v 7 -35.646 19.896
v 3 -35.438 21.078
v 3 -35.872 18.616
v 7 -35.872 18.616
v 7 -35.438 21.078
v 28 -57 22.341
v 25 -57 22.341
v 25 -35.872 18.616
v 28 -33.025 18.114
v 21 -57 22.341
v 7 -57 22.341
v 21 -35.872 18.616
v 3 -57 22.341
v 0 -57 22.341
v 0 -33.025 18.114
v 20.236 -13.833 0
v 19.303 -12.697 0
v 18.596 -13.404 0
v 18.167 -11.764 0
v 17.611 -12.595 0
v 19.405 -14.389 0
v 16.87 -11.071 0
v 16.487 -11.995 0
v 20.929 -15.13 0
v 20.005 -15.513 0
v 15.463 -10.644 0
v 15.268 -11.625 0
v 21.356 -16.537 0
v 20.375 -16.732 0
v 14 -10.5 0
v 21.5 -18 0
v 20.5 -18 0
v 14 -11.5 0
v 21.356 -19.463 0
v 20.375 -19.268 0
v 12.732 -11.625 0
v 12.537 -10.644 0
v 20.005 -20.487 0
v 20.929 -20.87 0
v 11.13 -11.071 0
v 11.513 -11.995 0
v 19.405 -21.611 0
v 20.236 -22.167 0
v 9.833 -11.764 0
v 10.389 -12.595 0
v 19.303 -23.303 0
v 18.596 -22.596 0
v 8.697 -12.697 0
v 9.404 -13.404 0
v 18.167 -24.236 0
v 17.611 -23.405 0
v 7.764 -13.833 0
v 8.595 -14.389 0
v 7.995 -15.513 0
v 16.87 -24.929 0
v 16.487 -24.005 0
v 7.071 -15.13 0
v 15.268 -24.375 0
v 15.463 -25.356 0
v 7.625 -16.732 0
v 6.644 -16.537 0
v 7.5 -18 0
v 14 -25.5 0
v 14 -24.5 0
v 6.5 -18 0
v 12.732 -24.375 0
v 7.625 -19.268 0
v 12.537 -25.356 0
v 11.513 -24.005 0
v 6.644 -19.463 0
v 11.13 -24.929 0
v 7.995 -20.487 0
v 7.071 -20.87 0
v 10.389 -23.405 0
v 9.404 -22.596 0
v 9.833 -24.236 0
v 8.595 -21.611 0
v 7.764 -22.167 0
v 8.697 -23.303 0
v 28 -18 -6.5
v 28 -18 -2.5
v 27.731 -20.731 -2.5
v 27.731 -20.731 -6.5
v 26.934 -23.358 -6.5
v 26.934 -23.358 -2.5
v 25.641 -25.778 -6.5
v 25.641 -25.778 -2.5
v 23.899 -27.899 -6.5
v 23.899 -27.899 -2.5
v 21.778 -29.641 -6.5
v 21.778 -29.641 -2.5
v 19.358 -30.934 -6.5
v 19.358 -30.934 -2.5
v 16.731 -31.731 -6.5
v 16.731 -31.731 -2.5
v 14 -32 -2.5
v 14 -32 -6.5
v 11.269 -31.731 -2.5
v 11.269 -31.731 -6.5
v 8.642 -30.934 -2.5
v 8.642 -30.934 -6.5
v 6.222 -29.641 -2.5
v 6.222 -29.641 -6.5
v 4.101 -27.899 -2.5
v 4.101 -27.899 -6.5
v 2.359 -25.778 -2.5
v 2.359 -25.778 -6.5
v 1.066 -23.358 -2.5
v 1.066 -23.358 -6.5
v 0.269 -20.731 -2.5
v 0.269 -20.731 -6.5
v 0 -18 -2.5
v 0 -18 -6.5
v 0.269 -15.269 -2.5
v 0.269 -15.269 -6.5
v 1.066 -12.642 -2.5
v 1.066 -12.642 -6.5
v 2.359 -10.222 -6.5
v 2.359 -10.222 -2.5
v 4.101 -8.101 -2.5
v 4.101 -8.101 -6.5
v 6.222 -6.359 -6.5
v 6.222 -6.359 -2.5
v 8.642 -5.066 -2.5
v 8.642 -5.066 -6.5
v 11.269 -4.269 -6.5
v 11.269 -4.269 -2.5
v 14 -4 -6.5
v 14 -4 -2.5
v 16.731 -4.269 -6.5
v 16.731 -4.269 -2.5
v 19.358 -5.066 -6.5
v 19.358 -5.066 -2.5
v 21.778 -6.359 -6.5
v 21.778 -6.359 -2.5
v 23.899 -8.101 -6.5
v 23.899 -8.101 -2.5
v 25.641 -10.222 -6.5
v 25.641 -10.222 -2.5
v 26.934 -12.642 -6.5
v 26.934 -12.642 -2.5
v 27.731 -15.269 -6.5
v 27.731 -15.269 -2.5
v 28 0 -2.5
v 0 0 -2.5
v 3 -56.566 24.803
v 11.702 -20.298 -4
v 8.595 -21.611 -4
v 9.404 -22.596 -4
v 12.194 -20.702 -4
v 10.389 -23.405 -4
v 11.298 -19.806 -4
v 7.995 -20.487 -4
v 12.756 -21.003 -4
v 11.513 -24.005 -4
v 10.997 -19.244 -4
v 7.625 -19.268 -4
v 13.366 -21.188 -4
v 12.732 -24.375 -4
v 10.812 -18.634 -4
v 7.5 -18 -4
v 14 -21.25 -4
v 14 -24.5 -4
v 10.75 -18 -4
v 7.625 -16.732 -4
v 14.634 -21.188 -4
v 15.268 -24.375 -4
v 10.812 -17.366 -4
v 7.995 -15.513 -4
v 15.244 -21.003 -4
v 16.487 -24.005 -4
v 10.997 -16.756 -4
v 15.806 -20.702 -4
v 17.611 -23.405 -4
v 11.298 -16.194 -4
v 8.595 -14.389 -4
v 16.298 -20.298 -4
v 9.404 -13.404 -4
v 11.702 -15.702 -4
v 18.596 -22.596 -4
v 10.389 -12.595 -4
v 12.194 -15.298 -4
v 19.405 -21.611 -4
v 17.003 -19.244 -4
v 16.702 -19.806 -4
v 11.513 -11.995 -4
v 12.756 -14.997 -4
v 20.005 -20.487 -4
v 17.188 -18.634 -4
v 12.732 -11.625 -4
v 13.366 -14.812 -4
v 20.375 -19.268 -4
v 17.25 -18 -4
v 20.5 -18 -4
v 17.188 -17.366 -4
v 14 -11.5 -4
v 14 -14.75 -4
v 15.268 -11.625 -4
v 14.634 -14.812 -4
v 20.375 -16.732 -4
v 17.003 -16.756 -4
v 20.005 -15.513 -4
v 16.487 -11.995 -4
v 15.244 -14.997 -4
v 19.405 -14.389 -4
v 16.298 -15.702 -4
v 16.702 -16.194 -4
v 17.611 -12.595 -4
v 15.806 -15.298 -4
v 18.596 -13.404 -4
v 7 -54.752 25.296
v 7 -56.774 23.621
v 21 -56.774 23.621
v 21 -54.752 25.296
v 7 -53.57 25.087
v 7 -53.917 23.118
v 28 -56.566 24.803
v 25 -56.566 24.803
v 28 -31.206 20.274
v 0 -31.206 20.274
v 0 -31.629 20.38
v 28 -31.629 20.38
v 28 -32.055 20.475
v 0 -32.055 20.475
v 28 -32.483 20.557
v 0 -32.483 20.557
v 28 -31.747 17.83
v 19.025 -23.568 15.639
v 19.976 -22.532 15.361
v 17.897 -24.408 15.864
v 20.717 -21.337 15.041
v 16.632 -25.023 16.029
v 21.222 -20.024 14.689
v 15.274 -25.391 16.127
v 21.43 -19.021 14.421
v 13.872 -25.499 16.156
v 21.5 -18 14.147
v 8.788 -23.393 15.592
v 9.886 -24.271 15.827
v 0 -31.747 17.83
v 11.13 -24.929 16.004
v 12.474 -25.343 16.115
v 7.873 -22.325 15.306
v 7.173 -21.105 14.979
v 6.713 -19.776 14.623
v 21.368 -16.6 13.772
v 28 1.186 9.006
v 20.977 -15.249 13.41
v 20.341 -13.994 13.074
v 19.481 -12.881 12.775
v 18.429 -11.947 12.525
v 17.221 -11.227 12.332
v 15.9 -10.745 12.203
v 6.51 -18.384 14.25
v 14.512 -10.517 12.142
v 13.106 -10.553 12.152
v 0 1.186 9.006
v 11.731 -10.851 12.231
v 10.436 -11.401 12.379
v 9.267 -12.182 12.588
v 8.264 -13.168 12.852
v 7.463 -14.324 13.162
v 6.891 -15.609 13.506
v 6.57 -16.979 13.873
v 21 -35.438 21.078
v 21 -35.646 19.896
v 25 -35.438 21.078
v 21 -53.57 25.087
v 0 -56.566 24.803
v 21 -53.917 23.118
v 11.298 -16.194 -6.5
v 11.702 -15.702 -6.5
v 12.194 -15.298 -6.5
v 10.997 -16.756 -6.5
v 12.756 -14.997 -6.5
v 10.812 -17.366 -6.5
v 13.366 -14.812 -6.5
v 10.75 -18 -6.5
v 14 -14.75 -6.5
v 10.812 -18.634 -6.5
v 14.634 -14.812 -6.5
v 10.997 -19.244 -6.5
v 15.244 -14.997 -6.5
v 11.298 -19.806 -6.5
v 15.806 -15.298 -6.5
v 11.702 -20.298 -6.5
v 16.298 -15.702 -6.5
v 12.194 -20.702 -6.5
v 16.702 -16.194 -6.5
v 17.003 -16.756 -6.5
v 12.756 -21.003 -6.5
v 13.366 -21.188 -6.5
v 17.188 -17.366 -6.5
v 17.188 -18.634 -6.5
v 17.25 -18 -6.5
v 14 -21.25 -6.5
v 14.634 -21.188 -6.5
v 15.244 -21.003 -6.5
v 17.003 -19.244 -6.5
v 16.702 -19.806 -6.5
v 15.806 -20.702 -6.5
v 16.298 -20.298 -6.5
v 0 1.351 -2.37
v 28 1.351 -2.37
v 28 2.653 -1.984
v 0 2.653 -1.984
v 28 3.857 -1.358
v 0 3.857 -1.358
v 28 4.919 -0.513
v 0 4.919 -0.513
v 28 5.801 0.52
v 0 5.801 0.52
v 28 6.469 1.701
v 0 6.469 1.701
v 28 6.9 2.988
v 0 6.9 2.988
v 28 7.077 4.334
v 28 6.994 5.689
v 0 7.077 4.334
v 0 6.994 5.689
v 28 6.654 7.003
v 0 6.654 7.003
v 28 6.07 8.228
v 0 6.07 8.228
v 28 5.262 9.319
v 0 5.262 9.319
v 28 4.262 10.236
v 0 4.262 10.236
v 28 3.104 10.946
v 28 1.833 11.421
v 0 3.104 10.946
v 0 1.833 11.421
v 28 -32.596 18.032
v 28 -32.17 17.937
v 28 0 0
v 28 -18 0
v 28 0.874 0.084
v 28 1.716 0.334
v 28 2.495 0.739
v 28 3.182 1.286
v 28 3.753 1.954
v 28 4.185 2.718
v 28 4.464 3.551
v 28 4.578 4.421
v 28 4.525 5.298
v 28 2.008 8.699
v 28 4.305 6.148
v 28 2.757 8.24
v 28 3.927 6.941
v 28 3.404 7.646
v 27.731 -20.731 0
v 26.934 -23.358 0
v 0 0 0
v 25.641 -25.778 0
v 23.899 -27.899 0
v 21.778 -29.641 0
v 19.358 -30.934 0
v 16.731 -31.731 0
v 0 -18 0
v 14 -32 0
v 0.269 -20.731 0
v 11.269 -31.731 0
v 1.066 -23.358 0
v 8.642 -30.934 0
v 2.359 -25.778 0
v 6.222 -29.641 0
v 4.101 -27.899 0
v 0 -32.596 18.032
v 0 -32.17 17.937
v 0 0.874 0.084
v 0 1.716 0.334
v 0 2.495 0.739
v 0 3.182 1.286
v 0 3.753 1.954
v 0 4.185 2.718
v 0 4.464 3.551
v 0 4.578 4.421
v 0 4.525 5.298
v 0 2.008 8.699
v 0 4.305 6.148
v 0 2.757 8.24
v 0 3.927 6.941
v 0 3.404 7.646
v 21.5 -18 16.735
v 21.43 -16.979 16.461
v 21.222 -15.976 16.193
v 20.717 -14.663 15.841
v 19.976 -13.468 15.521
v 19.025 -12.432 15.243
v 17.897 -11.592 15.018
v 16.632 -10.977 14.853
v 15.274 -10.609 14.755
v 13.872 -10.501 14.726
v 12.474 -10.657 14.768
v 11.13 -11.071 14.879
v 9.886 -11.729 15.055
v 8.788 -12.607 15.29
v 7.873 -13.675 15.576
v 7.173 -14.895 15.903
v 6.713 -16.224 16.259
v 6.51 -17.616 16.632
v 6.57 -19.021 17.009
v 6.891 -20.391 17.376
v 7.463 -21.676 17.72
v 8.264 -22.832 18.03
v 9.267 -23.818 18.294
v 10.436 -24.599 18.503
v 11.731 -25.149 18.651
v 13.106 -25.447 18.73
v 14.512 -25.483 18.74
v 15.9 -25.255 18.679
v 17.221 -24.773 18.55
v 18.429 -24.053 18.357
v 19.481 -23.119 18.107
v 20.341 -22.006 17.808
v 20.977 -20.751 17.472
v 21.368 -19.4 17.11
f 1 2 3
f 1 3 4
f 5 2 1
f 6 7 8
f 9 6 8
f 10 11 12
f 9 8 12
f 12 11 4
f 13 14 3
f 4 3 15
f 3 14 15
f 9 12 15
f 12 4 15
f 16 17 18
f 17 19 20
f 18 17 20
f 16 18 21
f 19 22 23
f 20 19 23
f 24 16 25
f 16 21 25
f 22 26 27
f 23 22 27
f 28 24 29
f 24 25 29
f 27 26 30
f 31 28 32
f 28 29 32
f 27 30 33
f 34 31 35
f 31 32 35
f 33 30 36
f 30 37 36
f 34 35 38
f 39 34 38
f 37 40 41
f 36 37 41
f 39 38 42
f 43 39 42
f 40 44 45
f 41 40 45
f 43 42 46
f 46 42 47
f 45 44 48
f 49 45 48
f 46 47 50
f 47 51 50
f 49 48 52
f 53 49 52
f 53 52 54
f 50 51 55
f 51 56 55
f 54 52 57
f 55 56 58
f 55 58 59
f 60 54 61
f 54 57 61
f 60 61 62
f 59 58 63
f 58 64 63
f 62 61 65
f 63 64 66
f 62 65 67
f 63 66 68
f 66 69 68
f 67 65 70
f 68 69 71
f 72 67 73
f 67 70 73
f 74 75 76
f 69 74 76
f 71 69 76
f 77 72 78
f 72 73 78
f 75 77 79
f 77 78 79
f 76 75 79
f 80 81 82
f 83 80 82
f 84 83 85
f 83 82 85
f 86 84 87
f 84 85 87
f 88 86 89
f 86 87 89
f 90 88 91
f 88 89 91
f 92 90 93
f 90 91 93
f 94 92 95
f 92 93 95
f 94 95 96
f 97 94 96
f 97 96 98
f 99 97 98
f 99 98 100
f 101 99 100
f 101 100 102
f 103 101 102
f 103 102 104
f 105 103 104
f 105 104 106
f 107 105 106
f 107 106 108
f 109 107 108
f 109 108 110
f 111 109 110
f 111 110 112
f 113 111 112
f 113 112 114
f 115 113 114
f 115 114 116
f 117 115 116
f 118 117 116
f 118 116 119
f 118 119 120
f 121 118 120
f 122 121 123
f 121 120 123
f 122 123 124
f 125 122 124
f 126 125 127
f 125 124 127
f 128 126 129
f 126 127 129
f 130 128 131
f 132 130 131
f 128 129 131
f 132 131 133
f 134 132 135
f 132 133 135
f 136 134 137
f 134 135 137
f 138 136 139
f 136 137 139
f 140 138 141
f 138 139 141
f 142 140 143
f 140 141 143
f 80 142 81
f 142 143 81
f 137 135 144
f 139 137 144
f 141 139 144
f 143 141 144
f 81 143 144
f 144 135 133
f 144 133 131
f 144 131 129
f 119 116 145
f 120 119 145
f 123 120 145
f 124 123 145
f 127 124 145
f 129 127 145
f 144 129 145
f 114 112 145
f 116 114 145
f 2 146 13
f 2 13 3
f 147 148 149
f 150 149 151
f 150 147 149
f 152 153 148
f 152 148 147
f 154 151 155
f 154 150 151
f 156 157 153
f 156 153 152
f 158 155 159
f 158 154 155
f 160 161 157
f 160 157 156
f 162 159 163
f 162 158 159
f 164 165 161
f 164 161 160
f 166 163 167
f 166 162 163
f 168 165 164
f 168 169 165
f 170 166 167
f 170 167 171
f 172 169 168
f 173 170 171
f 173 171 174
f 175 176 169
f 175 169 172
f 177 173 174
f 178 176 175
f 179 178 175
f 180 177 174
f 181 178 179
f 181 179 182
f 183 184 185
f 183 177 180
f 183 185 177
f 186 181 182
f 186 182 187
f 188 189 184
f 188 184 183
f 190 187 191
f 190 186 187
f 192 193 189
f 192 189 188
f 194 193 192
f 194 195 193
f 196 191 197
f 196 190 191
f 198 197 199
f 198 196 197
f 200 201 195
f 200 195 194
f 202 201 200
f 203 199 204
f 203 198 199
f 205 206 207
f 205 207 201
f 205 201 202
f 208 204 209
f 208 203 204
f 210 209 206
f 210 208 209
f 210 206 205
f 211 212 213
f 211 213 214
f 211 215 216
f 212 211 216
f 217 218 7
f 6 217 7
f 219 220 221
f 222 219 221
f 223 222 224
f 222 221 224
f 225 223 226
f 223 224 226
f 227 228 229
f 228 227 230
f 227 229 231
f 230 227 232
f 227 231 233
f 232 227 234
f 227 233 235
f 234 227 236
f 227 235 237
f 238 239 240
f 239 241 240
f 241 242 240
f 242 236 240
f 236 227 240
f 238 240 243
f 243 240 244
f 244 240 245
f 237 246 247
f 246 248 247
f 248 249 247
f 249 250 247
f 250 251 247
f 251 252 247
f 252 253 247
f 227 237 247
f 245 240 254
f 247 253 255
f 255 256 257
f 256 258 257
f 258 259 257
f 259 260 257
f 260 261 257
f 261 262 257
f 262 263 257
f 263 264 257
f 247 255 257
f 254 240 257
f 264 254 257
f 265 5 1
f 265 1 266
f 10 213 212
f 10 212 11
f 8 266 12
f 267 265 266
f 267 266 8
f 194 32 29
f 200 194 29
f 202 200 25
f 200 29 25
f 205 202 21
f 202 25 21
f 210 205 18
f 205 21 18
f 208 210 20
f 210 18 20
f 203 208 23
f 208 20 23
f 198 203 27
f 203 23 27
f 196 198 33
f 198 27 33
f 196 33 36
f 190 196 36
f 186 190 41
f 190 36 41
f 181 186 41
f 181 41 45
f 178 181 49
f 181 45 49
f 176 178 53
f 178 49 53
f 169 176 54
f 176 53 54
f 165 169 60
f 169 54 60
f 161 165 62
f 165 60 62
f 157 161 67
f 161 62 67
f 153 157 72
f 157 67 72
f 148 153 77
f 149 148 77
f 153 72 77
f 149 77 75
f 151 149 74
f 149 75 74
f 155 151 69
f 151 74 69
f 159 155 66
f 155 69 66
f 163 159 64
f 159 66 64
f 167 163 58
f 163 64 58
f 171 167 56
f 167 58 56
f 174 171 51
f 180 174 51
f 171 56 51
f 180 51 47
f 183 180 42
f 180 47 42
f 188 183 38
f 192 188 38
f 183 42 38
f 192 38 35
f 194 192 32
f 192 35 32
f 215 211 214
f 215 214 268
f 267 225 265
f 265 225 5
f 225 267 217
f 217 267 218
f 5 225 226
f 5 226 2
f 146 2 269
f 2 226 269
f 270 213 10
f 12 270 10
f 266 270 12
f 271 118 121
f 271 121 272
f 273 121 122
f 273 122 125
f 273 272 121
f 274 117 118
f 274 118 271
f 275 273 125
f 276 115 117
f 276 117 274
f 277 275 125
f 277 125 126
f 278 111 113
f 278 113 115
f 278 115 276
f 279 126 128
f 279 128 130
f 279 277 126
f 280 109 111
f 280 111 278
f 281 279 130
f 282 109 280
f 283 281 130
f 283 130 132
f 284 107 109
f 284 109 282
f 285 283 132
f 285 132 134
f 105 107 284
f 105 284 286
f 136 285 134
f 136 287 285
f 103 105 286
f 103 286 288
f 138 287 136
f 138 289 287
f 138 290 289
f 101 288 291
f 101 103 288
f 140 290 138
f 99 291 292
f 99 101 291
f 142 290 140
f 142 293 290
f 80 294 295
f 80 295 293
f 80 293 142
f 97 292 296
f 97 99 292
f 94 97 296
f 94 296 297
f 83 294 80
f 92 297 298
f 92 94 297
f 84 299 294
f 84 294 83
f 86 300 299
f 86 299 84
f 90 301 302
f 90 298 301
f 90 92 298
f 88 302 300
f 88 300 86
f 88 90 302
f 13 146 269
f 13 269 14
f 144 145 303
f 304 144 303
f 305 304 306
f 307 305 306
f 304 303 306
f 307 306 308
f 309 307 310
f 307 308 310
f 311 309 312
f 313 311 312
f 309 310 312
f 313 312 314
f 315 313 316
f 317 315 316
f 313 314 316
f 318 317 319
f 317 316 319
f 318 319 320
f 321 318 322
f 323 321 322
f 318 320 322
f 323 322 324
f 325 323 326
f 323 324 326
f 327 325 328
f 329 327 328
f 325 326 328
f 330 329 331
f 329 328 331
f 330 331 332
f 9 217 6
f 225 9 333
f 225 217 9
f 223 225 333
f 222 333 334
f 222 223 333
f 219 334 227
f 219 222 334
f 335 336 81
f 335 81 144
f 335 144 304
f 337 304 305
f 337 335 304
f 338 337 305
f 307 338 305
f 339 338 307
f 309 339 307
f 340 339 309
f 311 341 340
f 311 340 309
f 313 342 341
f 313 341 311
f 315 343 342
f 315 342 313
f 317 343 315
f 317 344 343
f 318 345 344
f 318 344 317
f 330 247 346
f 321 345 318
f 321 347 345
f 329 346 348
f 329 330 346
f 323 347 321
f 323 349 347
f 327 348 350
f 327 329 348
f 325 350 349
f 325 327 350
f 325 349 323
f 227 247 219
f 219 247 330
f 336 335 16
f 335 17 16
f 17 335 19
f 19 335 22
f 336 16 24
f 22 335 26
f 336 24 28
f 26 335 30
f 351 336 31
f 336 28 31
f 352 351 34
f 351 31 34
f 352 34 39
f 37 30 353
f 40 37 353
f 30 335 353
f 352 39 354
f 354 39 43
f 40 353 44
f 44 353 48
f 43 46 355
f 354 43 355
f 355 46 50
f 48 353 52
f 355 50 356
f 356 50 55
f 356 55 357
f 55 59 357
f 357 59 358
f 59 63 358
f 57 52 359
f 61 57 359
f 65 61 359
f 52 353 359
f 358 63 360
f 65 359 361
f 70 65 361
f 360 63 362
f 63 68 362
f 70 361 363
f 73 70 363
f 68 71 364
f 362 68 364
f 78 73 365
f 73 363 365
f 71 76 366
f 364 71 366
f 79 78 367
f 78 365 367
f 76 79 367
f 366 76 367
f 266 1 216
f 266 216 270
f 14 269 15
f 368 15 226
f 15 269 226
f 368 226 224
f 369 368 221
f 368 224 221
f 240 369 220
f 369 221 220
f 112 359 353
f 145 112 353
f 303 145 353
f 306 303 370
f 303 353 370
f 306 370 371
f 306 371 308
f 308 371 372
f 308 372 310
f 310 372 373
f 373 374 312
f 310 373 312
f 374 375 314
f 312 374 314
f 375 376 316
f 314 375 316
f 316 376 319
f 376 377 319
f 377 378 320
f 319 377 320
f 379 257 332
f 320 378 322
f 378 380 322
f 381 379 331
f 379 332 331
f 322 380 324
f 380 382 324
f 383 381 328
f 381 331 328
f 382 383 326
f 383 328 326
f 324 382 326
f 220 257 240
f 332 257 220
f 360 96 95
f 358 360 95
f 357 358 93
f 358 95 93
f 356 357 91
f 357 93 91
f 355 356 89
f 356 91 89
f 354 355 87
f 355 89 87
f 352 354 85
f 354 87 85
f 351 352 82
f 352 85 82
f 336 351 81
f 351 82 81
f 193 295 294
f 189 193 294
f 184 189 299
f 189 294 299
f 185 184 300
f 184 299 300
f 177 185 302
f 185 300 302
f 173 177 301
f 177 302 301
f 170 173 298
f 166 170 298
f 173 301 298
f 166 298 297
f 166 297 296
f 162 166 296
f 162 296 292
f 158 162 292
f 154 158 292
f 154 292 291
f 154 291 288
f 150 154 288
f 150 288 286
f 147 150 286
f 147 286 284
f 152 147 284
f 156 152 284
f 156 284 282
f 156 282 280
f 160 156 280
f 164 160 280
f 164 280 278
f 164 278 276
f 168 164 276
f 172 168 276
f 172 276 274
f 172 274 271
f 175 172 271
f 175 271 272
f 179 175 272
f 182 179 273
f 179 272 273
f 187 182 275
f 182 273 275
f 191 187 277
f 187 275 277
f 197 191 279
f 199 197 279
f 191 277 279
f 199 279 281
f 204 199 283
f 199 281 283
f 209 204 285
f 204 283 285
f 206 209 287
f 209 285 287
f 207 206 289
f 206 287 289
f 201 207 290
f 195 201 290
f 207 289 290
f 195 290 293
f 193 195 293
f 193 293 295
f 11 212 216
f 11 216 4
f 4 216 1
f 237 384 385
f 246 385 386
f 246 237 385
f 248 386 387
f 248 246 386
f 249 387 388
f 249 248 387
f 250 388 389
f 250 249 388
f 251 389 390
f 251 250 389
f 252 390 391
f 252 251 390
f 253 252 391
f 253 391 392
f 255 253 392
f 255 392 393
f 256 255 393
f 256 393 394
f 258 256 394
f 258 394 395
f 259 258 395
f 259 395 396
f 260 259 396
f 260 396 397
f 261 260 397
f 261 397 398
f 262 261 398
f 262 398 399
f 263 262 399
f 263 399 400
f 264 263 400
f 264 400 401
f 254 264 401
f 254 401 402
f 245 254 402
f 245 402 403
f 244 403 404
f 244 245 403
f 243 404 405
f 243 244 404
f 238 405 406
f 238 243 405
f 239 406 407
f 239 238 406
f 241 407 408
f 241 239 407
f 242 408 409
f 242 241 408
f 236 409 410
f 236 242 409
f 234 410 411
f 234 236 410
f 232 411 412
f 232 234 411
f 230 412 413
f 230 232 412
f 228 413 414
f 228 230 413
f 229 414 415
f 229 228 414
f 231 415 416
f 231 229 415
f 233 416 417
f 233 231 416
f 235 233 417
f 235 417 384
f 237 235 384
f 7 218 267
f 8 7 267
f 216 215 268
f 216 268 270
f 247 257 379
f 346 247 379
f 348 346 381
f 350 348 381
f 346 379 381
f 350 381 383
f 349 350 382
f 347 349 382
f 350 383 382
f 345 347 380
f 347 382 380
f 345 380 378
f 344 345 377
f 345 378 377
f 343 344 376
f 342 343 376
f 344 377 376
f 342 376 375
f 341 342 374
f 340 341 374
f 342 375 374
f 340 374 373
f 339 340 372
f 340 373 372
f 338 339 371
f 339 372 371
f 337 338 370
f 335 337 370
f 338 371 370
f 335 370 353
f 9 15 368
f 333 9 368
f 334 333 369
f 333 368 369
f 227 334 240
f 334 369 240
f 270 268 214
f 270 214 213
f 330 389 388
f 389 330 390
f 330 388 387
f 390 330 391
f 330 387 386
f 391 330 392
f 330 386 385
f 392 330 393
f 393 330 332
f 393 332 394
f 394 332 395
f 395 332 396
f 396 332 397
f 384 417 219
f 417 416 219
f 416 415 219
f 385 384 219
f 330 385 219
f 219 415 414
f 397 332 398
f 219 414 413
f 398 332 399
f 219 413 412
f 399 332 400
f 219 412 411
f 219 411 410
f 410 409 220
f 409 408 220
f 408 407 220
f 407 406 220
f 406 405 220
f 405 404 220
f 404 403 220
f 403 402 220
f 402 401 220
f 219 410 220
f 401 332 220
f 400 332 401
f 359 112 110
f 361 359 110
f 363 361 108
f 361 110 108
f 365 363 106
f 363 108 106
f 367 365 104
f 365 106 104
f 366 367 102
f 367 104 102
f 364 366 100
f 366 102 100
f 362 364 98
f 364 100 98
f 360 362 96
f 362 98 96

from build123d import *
from build123d import SkipClean  # not in build123d's __all__

# Parameters (mm, degrees)
F1_DEPTH    = 28
F2_T1_DEPTH = 28
F2_T3_DEPTH = 31.2745707181
F3_R        = 14
F4_DEPTH    = 4
F6_DEPTH    = 2.5
F7_R        = 3.25
F8_DEPTH    = 31.3042238242
F9_R        = 7.5
F10_DEPTH   = 24.8042238242
F11_R       = 6.5
F12_DEPTH   = 4
F13_W       = 4
F13_H       = 21.4542382136
F14_DEPTH   = 2.5
F15_W       = 14
F15_H       = 21.4542382136
F16_DEPTH   = 1.2
F18_DEPTH   = 14


# Not quite as in the source:
# - a fillet or chamfer that OpenCascade refuses, or shapes differently, is made with other operations: its cross-section is extruded or revolved along the edge and cut away or added


with BuildPart() as f1:
    # F0 (on Right) → F1 (new body)
    with BuildSketch(Plane.YZ):
        with BuildLine():
            Line((0, 0), (-32, 0))
            Line((-32, 0), (-32, -2.5))
            Line((-32, -2.5), (0, -2.5))
            ThreePointArc((0, -2.5), (7.0205462081, 3.6568537819), (1.8327303277, 11.4209689242))
            Line((1.8327303277, 11.4209689242), (-31.8381916428, 20.4430652746))
            Line((-31.8381916428, 20.4430652746), (-56.5658795558, 24.8032238242))
            Line((-56.5658795558, 24.8032238242), (-57, 22.3412044417))
            Line((-57, 22.3412044417), (-32.3798061747, 18))
            Line((-32.3798061747, 18), (1.1856827149, 9.0061543585))
            ThreePointArc((1.1856827149, 9.0061543585), (4.5419340547, 3.9831692624), (0, 0))
        make_face()
    extrude(amount=F1_DEPTH)

    # F2: fillet of radius 15 on 2 edges, made by hand

    # F2_s2 → F2_t1 (join)
    with BuildSketch(Plane.YZ):
        with BuildLine():
            ThreePointArc((-33.0247707009, 18.1137246476), (-32.3828991568, 17.9860484592), (-31.7472076894, 17.8304957467))
            Line((-31.7472076894, 17.8304957467), (-32.3798061747, 18))
            Line((-32.3798061747, 18), (-33.0247707009, 18.1137246476))
        make_face()
    extrude(amount=F2_T1_DEPTH)

    # F2_s4 → F2_t3 (cut)
    with BuildSketch(Plane.YZ.offset(-1.6372853591)):
        with BuildLine():
            ThreePointArc((-31.2055931575, 20.2735610213), (-31.841284625, 20.4291137338), (-32.483156169, 20.5567899222))
            Line((-32.483156169, 20.5567899222), (-31.8381916428, 20.4430652746))
            Line((-31.8381916428, 20.4430652746), (-31.2055931575, 20.2735610213))
        make_face()
    extrude(amount=F2_T3_DEPTH, mode=Mode.SUBTRACT)

    # F3 (on face) → F4 (join)
    with BuildSketch(Plane(origin=(0, 0, -2.5), x_dir=(1, 0, 0), z_dir=(0, 0, -1))):
        with Locations((14, 18)):
            Circle(F3_R)
    extrude(amount=F4_DEPTH)

    # F5 (on face) → F6 (cut, through all)
    with BuildSketch(Plane(origin=(0, 0, -2.5), x_dir=(1, 0, 0), z_dir=(0, 0, -1))):
        with BuildLine():
            ThreePointArc((0, 18), (4.1005050634, 27.8994949366), (14, 32))
            Line((14, 32), (0, 32))
            Line((0, 32), (0, 18))
        make_face()
        with BuildLine():
            Line((28, 18), (28, 32))
            Line((28, 32), (14, 32))
            ThreePointArc((14, 32), (23.8994949366, 27.8994949366), (28, 18))
        make_face()
    with SkipClean():  # cleaning this boolean's faces spoils the solid; the shape is the same uncleaned
        extrude(amount=-F6_DEPTH, mode=Mode.SUBTRACT)

    # F7 (on face) → F8 (cut, through all)
    with BuildSketch(Plane(origin=(0, 0, -6.5), x_dir=(1, 0, 0), z_dir=(0, 0, -1))):
        with Locations((14, 18)):
            Circle(F7_R)
    with SkipClean():  # cleaning this boolean's faces spoils the solid; the shape is the same uncleaned
        extrude(amount=-F8_DEPTH, mode=Mode.SUBTRACT)

    # F9 (on face) → F10 (cut, through all)
    with BuildSketch(Plane.XY):
        with Locations((14, -18)):
            Circle(F9_R)
    with SkipClean():  # cleaning this boolean's faces spoils the solid; the shape is the same uncleaned
        extrude(amount=F10_DEPTH, mode=Mode.SUBTRACT)

    # F11 (on face) → F12 (cut)
    with BuildSketch(Plane.XY):
        with Locations((14, -18)):
            Circle(F11_R)
    with SkipClean():  # cleaning this boolean's faces spoils the solid; the shape is the same uncleaned
        extrude(amount=-F12_DEPTH, mode=Mode.SUBTRACT)

    # F13 (on face) → F14 (cut, through all)
    with BuildSketch(Plane(origin=(0, 2.5359311092, 14.3819799952), x_dir=(1, 0, 0), z_dir=(0, 0.1736481777, 0.984807753))):
        with Locations((23, -49.2864322531)):
            Rectangle(F13_W, F13_H)
        with Locations((5, -49.2864322531)):
            Rectangle(F13_W, F13_H)
    with SkipClean():  # cleaning this boolean's faces spoils the solid; the shape is the same uncleaned
        extrude(amount=-F14_DEPTH, mode=Mode.SUBTRACT)

    # F15 (on face) → F16 (cut)
    with BuildSketch(Plane(origin=(0, 2.5359311092, 14.3819799952), x_dir=(1, 0, 0), z_dir=(0, 0.1736481777, 0.984807753))):
        with Locations((14, -49.2864322531)):
            Rectangle(F15_W, F15_H)
    with SkipClean():  # cleaning this boolean's faces spoils the solid; the shape is the same uncleaned
        extrude(amount=-F16_DEPTH, mode=Mode.SUBTRACT)

    # F17 (on face) → F18 (join, through all)
    with BuildSketch(Plane(origin=(7, 0, 0), x_dir=(0, -1, 0), z_dir=(-1, 0, 0))):
        Polygon((53.5699966888, 25.0873101332), (53.9172930442, 23.1176946272), (56.774257369, 23.6214545206), (54.7517659925, 25.2956879464), align=None)
    with SkipClean():  # cleaning this boolean's faces spoils the solid; the shape is the same uncleaned
        extrude(amount=-F18_DEPTH)


solid = f1.part
